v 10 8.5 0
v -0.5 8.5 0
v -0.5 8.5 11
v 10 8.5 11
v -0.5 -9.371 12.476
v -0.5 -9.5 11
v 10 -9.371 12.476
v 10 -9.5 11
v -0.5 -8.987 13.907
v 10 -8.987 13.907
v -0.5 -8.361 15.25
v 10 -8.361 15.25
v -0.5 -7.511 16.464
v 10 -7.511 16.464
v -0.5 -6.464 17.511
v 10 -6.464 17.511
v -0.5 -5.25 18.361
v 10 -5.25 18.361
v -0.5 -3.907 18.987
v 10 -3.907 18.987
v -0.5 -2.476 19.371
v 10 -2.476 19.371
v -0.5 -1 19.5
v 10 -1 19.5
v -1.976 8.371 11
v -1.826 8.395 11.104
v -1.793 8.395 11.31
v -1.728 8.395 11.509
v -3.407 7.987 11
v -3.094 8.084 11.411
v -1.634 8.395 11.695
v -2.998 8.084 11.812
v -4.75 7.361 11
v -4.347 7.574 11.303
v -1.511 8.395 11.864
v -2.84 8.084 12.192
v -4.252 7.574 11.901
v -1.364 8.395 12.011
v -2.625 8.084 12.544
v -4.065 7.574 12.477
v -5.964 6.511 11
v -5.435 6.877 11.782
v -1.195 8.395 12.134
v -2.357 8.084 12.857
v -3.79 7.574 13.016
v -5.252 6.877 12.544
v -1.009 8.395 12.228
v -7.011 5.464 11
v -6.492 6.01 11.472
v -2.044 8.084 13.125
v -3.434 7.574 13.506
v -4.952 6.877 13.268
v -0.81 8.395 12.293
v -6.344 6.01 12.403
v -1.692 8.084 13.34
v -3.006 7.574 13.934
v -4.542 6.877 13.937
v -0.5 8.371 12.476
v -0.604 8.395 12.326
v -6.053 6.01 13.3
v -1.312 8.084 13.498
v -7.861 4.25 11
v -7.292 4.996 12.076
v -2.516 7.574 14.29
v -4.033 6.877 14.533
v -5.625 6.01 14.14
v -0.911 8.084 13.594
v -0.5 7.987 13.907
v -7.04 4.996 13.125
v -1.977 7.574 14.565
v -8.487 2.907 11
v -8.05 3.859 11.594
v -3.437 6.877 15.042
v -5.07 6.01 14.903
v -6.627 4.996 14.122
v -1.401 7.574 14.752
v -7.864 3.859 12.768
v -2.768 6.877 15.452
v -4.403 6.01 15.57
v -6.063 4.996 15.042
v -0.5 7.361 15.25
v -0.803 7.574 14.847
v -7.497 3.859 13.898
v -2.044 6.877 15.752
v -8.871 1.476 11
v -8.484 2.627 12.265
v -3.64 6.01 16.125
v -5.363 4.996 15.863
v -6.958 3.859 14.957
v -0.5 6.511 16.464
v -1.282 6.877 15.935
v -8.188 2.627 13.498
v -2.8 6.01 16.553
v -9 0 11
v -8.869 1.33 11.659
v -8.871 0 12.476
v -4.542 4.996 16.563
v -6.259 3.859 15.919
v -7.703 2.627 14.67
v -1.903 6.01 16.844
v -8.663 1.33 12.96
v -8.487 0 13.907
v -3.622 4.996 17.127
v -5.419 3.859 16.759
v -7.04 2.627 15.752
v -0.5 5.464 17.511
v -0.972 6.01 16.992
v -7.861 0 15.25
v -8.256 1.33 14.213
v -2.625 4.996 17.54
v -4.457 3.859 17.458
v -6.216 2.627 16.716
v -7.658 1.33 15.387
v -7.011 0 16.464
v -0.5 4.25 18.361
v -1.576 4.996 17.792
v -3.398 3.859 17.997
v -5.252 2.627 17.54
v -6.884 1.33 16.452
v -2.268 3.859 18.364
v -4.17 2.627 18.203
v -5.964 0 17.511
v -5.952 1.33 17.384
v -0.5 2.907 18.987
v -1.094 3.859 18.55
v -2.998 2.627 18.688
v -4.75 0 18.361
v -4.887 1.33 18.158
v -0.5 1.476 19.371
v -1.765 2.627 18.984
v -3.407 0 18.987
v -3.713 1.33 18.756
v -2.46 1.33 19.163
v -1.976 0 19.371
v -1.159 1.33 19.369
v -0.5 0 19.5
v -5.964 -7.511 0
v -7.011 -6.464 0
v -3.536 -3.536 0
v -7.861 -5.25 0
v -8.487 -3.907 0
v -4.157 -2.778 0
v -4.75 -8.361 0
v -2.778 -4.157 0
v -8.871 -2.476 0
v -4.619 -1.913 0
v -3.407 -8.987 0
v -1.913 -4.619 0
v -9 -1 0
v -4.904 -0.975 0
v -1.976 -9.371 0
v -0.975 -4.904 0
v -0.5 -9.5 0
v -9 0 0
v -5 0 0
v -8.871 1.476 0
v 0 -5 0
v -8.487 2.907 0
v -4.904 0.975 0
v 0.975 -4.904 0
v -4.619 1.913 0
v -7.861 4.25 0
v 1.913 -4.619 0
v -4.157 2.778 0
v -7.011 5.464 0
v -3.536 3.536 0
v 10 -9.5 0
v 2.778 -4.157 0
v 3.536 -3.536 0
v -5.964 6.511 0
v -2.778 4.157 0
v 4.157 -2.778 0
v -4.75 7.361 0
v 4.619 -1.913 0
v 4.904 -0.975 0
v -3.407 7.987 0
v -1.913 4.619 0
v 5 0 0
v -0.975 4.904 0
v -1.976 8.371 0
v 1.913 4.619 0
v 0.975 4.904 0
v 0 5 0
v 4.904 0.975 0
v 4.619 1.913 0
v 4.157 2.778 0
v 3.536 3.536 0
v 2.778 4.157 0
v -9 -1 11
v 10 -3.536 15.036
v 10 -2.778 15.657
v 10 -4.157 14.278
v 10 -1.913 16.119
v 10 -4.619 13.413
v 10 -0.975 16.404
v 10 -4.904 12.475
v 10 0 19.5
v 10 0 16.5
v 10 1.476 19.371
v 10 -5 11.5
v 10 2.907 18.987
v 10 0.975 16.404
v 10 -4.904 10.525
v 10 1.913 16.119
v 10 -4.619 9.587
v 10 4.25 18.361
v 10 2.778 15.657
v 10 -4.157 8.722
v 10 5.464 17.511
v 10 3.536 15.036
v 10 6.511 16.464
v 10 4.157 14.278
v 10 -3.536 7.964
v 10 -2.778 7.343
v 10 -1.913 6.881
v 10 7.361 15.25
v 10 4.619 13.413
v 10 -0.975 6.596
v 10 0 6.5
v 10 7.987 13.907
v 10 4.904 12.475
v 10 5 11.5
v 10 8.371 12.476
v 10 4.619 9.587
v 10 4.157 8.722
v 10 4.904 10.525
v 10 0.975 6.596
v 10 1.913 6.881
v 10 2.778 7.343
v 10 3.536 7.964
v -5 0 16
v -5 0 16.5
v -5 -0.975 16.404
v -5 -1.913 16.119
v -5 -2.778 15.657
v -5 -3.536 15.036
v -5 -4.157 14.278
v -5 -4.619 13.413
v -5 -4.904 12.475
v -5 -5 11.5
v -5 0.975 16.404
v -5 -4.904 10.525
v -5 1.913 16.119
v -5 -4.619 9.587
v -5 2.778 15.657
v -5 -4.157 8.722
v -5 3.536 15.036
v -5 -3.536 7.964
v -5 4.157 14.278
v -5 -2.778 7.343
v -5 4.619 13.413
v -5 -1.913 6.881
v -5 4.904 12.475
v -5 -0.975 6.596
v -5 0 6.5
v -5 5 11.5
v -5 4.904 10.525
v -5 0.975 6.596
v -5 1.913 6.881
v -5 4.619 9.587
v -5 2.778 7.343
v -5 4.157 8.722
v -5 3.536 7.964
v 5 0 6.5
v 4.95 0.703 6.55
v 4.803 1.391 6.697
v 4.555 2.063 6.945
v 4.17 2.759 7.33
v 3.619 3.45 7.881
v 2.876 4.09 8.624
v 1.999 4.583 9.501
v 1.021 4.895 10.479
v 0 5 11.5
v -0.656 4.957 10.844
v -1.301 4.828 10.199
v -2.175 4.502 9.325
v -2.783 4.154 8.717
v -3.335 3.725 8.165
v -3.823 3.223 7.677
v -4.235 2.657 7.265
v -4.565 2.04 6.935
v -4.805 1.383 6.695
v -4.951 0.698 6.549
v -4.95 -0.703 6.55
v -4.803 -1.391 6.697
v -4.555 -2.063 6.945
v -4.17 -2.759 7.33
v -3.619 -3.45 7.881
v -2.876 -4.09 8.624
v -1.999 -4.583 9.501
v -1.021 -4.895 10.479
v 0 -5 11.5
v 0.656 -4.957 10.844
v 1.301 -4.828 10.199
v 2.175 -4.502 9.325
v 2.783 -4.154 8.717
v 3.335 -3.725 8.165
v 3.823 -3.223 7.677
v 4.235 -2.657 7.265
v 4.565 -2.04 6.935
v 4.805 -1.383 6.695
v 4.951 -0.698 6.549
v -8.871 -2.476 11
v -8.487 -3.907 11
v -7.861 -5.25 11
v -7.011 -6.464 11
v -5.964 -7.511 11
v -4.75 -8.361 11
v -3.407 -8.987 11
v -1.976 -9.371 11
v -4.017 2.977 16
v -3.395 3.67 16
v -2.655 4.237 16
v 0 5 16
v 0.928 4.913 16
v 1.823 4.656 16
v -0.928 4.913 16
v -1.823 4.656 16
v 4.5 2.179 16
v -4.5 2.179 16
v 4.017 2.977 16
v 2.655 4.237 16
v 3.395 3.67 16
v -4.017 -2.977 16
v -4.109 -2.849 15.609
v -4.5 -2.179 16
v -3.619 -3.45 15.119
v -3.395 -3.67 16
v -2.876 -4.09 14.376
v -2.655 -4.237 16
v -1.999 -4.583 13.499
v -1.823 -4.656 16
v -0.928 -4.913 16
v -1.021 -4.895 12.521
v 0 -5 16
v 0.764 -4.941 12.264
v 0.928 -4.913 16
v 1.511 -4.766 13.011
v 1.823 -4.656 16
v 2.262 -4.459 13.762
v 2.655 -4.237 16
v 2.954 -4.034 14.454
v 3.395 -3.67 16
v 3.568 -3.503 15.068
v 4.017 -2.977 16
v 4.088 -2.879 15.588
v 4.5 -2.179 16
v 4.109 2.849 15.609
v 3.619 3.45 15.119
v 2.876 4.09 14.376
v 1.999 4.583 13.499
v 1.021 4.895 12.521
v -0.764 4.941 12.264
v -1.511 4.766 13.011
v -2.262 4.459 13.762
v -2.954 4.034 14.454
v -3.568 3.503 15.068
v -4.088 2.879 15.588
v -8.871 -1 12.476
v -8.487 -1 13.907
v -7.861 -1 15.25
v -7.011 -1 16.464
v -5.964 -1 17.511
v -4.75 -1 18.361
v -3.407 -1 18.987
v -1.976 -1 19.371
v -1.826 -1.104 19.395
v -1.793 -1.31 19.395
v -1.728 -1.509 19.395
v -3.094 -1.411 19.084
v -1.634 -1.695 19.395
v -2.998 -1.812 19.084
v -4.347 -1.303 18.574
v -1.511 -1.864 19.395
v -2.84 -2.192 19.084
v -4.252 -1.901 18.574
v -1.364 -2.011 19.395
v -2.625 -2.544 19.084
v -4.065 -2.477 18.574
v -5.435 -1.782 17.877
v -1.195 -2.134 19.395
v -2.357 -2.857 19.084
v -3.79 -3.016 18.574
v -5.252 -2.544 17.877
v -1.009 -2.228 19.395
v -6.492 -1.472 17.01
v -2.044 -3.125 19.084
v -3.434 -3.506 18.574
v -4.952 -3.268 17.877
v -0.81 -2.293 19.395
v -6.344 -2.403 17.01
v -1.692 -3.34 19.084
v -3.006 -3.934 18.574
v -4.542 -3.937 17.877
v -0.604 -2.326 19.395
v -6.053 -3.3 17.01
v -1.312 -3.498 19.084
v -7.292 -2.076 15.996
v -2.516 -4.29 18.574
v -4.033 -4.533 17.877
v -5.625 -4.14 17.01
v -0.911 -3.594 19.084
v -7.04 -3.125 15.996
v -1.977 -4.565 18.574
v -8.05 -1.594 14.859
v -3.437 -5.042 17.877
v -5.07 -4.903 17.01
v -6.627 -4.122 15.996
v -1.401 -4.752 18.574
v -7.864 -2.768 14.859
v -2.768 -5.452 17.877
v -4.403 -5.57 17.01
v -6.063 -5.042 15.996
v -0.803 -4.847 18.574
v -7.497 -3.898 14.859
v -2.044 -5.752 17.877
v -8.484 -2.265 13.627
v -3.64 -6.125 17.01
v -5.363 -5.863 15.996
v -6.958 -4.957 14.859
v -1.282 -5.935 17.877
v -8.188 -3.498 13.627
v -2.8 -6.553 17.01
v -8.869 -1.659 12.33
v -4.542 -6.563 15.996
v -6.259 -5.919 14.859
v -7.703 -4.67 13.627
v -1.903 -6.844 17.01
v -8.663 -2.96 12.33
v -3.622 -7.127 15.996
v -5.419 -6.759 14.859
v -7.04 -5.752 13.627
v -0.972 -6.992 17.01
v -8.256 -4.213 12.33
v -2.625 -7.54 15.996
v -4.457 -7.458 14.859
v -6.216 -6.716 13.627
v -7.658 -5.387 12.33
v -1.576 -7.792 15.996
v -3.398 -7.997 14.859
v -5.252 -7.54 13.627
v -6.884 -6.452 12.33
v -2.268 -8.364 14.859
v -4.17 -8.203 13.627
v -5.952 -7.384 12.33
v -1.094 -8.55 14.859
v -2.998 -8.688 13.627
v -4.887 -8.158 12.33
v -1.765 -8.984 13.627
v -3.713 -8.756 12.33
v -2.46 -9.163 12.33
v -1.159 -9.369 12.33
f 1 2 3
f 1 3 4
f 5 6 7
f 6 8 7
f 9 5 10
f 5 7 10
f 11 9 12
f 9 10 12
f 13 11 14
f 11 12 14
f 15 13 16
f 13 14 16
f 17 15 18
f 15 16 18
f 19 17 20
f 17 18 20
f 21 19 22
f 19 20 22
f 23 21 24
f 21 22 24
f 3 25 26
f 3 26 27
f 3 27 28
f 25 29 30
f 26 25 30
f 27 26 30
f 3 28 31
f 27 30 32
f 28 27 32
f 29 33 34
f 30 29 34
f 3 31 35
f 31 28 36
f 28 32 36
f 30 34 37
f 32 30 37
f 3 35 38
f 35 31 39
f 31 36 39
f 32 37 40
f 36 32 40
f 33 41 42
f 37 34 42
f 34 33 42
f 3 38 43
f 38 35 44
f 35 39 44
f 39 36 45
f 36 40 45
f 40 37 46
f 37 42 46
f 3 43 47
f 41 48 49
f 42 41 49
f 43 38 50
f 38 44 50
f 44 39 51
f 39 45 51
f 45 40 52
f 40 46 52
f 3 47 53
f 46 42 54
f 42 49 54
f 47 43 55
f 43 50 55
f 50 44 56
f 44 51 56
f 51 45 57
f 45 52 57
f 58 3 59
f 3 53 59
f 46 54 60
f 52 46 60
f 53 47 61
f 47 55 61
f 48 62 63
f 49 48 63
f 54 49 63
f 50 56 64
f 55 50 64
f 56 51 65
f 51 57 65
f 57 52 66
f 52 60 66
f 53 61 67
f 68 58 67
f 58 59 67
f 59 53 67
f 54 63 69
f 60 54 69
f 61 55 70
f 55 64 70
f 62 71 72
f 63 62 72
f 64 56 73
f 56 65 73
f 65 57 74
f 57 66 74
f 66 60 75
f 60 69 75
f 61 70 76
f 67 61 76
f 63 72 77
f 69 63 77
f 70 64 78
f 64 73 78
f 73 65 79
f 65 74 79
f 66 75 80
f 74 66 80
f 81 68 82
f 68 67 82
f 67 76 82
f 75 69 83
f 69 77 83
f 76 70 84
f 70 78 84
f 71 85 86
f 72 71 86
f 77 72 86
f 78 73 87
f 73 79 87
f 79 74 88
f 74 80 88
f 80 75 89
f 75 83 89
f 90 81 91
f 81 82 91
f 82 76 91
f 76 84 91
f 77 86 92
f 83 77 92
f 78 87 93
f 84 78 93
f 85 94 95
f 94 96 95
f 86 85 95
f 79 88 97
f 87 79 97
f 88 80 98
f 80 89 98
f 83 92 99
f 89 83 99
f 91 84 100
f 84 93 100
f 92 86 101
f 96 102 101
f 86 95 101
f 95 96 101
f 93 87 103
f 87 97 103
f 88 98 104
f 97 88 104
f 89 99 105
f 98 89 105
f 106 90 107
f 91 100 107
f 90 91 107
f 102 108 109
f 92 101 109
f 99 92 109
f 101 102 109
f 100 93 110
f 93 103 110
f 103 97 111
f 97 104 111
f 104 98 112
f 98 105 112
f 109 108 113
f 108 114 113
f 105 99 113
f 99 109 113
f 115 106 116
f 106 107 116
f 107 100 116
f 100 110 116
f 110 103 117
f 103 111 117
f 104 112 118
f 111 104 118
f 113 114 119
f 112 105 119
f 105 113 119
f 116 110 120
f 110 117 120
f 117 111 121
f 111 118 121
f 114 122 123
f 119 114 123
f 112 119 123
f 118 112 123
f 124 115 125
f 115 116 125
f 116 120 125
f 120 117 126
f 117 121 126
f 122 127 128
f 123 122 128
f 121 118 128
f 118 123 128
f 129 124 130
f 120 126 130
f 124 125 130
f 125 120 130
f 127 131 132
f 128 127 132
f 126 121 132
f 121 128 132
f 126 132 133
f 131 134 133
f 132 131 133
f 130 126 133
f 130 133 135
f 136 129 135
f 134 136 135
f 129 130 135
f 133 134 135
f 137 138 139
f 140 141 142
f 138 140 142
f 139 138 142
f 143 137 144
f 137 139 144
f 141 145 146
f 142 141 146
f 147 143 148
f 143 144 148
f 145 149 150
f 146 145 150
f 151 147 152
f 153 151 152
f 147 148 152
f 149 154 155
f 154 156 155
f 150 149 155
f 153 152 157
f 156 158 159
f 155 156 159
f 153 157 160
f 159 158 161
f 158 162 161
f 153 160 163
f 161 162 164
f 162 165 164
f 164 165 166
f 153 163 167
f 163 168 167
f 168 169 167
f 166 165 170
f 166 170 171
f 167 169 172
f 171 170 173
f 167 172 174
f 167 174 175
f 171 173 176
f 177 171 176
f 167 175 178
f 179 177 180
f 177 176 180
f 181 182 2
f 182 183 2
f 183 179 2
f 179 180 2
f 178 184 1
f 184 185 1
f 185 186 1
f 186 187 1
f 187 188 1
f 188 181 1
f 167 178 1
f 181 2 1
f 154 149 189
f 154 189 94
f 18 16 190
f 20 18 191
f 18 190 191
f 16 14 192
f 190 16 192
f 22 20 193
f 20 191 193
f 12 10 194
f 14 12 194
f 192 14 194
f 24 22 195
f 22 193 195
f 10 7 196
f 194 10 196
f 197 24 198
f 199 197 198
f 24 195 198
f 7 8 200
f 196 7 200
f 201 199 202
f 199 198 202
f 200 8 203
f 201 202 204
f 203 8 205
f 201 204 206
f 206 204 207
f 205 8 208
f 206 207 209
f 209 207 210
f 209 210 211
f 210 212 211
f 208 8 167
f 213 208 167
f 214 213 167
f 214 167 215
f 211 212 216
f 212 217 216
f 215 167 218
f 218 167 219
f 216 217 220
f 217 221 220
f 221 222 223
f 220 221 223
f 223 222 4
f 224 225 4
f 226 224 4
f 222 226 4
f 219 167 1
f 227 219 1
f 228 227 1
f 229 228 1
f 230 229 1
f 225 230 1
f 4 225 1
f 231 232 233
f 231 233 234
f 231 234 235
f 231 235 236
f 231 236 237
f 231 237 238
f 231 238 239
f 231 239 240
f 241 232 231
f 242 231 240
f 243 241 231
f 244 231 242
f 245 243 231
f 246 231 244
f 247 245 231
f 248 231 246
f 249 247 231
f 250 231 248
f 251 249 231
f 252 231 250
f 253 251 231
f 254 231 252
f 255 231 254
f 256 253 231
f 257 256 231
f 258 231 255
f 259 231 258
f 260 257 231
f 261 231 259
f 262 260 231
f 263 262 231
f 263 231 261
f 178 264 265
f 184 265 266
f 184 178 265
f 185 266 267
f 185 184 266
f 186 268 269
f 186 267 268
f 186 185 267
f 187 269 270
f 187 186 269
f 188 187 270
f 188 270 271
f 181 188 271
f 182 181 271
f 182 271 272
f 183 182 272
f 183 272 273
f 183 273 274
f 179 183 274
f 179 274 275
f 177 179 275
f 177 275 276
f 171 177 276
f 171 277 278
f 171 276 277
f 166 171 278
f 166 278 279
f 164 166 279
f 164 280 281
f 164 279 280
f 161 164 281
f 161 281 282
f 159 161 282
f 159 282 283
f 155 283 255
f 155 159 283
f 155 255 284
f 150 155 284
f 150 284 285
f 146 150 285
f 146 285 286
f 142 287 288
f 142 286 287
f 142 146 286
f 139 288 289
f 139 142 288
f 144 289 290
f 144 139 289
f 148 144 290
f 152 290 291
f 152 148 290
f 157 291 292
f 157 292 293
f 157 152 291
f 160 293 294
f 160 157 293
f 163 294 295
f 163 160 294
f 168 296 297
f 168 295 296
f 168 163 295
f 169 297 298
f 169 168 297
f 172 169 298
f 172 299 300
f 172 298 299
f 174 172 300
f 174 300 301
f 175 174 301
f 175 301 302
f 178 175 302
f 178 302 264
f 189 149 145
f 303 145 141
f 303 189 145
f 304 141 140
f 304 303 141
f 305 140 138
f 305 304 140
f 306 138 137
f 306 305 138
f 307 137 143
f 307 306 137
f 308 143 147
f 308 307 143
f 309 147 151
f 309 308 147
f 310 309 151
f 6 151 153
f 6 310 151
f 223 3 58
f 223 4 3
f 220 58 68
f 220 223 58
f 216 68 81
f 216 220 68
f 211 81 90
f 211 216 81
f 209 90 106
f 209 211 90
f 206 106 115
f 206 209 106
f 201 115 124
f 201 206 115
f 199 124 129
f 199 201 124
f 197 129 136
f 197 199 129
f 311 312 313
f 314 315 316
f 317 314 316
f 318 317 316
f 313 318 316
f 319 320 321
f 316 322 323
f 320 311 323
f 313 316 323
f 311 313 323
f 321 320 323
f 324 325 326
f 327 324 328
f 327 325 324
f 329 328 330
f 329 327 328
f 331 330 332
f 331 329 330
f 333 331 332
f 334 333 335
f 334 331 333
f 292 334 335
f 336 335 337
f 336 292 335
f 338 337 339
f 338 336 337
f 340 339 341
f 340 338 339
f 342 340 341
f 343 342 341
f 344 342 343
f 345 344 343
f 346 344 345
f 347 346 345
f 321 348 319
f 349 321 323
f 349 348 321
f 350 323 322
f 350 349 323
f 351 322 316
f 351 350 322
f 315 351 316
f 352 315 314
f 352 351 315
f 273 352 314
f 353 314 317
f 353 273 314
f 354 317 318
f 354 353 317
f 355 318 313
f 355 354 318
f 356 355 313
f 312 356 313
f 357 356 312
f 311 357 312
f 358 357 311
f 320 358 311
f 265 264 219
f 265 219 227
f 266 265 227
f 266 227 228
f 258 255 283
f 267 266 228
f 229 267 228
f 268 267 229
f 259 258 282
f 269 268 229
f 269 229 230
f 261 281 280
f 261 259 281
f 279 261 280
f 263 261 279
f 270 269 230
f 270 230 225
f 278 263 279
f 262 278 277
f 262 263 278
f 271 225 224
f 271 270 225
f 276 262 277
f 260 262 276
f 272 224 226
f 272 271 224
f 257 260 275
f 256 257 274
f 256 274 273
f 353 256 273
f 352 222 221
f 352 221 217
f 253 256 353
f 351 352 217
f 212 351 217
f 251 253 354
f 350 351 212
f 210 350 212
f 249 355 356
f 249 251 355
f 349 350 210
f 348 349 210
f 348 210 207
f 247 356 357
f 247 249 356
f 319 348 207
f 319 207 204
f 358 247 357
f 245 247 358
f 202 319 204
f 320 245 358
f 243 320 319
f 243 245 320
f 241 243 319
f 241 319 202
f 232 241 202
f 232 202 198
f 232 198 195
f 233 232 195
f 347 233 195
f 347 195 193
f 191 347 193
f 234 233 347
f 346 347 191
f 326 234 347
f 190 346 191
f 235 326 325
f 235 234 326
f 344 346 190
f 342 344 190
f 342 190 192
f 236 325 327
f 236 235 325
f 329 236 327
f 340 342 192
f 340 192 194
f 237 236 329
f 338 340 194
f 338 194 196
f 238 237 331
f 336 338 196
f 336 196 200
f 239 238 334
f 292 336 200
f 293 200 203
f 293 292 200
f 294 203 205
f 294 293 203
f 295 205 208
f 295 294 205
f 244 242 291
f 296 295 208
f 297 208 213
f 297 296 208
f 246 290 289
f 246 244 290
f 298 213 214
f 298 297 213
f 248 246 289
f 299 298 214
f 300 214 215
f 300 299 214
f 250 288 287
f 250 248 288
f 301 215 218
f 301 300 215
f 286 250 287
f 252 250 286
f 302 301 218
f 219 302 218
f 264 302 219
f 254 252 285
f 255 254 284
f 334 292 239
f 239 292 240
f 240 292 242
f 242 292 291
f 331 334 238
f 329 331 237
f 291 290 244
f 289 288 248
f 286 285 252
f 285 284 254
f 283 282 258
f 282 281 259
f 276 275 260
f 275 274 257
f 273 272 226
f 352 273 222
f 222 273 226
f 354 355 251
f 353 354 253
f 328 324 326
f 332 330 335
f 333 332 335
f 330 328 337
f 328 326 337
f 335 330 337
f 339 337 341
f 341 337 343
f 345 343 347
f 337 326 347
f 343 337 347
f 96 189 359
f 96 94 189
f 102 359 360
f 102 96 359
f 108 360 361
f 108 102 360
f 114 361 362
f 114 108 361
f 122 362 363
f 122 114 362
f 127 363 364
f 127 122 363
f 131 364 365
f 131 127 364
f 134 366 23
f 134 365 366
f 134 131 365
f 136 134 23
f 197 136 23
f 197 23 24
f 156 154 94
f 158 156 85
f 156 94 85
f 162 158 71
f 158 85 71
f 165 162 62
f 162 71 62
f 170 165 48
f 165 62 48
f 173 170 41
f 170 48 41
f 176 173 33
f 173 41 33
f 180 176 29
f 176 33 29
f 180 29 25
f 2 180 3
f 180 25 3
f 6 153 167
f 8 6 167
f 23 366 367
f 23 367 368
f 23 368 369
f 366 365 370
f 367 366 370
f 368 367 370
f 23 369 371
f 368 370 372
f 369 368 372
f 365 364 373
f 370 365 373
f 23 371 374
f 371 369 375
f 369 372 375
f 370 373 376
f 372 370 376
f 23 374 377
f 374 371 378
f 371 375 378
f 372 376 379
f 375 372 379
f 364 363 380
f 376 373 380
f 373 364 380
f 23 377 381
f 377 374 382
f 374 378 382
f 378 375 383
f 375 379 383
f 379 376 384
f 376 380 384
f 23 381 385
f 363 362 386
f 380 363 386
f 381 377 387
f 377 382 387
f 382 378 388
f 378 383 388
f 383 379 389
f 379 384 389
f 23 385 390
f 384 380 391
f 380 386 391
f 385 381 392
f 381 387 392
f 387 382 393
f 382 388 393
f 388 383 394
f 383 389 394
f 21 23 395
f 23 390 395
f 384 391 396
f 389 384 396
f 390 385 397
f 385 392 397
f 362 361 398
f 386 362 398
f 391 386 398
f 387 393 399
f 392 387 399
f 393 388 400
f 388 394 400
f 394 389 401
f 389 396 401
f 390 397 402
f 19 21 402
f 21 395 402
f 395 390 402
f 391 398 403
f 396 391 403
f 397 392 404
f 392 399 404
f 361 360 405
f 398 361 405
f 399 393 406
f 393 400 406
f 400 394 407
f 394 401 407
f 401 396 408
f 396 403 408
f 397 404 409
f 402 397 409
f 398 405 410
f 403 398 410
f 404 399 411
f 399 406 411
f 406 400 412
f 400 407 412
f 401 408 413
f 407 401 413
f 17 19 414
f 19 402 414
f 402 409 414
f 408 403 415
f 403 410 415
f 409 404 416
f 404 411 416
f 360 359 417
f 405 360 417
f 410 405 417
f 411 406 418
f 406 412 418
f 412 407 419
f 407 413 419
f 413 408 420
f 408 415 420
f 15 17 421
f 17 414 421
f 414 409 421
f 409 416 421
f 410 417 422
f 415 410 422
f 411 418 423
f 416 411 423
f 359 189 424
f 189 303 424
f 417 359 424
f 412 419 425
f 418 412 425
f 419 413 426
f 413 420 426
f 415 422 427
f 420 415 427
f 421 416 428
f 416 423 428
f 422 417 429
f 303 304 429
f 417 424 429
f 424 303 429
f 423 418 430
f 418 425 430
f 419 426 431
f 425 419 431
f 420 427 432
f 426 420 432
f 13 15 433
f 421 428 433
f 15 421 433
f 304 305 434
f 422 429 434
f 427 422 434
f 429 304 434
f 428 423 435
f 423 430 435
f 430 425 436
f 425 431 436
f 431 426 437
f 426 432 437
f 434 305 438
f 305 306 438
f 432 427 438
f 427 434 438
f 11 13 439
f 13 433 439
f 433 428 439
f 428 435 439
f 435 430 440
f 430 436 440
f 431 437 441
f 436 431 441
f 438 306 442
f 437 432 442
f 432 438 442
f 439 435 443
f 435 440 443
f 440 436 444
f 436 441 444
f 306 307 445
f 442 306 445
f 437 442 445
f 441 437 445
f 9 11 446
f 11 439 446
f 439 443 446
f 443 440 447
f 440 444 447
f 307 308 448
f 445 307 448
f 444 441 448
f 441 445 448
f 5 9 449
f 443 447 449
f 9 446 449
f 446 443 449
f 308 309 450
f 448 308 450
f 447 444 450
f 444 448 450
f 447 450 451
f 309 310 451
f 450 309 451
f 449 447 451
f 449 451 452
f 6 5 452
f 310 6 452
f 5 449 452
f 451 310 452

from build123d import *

# Parameters (mm, degrees)
CYLINDER035_R     = 5
CYLINDER035_DEPTH = 15
CYLINDER034_R     = 5
CYLINDER034_DEPTH = 16
BOX017_W          = 19
BOX017_H          = 18
BOX017_DEPTH      = 19.5
FILLET006_R       = 8.5


with BuildPart() as c_top_hole001:
    # Cylinder035 → Cylinder035 (new body)
    with BuildSketch(Plane(origin=(-5, 0, 11.5), x_dir=(0, 0, -1), z_dir=(1, 0, 0))):
        Circle(CYLINDER035_R)
    extrude(amount=CYLINDER035_DEPTH)


with BuildPart() as c_holes:
    # Cylinder034 → Cylinder034 (new body)
    with BuildSketch(Plane.XY):
        Circle(CYLINDER034_R)
    extrude(amount=CYLINDER034_DEPTH)

    # Fusion039: union C-Top-Hole001
    add(c_top_hole001.part)


with BuildPart() as corner:
    # Box017 → Box017 (new body)
    with BuildSketch(Plane(origin=(-9, -9.5, 0), x_dir=(1, 0, 0), z_dir=(0, 0, 1))):
        with Locations((9.5, 9)):
            Rectangle(BOX017_W, BOX017_H)
    extrude(amount=BOX017_DEPTH)

    # Fillet006
    fillet006_edges = [corner.edges().sort_by_distance(p)[0] for p in [
        (-9, -9.5, 9.75),
        (-9, -0.5, 19.5),
        (-9, 8.5, 9.75),
        (0.5, -9.5, 19.5),
        (0.5, 8.5, 19.5),
    ]]
    fillet(fillet006_edges, radius=FILLET006_R)

    # Cut: cut C-Holes
    add(c_holes.part, mode=Mode.SUBTRACT)


solid = corner.part
